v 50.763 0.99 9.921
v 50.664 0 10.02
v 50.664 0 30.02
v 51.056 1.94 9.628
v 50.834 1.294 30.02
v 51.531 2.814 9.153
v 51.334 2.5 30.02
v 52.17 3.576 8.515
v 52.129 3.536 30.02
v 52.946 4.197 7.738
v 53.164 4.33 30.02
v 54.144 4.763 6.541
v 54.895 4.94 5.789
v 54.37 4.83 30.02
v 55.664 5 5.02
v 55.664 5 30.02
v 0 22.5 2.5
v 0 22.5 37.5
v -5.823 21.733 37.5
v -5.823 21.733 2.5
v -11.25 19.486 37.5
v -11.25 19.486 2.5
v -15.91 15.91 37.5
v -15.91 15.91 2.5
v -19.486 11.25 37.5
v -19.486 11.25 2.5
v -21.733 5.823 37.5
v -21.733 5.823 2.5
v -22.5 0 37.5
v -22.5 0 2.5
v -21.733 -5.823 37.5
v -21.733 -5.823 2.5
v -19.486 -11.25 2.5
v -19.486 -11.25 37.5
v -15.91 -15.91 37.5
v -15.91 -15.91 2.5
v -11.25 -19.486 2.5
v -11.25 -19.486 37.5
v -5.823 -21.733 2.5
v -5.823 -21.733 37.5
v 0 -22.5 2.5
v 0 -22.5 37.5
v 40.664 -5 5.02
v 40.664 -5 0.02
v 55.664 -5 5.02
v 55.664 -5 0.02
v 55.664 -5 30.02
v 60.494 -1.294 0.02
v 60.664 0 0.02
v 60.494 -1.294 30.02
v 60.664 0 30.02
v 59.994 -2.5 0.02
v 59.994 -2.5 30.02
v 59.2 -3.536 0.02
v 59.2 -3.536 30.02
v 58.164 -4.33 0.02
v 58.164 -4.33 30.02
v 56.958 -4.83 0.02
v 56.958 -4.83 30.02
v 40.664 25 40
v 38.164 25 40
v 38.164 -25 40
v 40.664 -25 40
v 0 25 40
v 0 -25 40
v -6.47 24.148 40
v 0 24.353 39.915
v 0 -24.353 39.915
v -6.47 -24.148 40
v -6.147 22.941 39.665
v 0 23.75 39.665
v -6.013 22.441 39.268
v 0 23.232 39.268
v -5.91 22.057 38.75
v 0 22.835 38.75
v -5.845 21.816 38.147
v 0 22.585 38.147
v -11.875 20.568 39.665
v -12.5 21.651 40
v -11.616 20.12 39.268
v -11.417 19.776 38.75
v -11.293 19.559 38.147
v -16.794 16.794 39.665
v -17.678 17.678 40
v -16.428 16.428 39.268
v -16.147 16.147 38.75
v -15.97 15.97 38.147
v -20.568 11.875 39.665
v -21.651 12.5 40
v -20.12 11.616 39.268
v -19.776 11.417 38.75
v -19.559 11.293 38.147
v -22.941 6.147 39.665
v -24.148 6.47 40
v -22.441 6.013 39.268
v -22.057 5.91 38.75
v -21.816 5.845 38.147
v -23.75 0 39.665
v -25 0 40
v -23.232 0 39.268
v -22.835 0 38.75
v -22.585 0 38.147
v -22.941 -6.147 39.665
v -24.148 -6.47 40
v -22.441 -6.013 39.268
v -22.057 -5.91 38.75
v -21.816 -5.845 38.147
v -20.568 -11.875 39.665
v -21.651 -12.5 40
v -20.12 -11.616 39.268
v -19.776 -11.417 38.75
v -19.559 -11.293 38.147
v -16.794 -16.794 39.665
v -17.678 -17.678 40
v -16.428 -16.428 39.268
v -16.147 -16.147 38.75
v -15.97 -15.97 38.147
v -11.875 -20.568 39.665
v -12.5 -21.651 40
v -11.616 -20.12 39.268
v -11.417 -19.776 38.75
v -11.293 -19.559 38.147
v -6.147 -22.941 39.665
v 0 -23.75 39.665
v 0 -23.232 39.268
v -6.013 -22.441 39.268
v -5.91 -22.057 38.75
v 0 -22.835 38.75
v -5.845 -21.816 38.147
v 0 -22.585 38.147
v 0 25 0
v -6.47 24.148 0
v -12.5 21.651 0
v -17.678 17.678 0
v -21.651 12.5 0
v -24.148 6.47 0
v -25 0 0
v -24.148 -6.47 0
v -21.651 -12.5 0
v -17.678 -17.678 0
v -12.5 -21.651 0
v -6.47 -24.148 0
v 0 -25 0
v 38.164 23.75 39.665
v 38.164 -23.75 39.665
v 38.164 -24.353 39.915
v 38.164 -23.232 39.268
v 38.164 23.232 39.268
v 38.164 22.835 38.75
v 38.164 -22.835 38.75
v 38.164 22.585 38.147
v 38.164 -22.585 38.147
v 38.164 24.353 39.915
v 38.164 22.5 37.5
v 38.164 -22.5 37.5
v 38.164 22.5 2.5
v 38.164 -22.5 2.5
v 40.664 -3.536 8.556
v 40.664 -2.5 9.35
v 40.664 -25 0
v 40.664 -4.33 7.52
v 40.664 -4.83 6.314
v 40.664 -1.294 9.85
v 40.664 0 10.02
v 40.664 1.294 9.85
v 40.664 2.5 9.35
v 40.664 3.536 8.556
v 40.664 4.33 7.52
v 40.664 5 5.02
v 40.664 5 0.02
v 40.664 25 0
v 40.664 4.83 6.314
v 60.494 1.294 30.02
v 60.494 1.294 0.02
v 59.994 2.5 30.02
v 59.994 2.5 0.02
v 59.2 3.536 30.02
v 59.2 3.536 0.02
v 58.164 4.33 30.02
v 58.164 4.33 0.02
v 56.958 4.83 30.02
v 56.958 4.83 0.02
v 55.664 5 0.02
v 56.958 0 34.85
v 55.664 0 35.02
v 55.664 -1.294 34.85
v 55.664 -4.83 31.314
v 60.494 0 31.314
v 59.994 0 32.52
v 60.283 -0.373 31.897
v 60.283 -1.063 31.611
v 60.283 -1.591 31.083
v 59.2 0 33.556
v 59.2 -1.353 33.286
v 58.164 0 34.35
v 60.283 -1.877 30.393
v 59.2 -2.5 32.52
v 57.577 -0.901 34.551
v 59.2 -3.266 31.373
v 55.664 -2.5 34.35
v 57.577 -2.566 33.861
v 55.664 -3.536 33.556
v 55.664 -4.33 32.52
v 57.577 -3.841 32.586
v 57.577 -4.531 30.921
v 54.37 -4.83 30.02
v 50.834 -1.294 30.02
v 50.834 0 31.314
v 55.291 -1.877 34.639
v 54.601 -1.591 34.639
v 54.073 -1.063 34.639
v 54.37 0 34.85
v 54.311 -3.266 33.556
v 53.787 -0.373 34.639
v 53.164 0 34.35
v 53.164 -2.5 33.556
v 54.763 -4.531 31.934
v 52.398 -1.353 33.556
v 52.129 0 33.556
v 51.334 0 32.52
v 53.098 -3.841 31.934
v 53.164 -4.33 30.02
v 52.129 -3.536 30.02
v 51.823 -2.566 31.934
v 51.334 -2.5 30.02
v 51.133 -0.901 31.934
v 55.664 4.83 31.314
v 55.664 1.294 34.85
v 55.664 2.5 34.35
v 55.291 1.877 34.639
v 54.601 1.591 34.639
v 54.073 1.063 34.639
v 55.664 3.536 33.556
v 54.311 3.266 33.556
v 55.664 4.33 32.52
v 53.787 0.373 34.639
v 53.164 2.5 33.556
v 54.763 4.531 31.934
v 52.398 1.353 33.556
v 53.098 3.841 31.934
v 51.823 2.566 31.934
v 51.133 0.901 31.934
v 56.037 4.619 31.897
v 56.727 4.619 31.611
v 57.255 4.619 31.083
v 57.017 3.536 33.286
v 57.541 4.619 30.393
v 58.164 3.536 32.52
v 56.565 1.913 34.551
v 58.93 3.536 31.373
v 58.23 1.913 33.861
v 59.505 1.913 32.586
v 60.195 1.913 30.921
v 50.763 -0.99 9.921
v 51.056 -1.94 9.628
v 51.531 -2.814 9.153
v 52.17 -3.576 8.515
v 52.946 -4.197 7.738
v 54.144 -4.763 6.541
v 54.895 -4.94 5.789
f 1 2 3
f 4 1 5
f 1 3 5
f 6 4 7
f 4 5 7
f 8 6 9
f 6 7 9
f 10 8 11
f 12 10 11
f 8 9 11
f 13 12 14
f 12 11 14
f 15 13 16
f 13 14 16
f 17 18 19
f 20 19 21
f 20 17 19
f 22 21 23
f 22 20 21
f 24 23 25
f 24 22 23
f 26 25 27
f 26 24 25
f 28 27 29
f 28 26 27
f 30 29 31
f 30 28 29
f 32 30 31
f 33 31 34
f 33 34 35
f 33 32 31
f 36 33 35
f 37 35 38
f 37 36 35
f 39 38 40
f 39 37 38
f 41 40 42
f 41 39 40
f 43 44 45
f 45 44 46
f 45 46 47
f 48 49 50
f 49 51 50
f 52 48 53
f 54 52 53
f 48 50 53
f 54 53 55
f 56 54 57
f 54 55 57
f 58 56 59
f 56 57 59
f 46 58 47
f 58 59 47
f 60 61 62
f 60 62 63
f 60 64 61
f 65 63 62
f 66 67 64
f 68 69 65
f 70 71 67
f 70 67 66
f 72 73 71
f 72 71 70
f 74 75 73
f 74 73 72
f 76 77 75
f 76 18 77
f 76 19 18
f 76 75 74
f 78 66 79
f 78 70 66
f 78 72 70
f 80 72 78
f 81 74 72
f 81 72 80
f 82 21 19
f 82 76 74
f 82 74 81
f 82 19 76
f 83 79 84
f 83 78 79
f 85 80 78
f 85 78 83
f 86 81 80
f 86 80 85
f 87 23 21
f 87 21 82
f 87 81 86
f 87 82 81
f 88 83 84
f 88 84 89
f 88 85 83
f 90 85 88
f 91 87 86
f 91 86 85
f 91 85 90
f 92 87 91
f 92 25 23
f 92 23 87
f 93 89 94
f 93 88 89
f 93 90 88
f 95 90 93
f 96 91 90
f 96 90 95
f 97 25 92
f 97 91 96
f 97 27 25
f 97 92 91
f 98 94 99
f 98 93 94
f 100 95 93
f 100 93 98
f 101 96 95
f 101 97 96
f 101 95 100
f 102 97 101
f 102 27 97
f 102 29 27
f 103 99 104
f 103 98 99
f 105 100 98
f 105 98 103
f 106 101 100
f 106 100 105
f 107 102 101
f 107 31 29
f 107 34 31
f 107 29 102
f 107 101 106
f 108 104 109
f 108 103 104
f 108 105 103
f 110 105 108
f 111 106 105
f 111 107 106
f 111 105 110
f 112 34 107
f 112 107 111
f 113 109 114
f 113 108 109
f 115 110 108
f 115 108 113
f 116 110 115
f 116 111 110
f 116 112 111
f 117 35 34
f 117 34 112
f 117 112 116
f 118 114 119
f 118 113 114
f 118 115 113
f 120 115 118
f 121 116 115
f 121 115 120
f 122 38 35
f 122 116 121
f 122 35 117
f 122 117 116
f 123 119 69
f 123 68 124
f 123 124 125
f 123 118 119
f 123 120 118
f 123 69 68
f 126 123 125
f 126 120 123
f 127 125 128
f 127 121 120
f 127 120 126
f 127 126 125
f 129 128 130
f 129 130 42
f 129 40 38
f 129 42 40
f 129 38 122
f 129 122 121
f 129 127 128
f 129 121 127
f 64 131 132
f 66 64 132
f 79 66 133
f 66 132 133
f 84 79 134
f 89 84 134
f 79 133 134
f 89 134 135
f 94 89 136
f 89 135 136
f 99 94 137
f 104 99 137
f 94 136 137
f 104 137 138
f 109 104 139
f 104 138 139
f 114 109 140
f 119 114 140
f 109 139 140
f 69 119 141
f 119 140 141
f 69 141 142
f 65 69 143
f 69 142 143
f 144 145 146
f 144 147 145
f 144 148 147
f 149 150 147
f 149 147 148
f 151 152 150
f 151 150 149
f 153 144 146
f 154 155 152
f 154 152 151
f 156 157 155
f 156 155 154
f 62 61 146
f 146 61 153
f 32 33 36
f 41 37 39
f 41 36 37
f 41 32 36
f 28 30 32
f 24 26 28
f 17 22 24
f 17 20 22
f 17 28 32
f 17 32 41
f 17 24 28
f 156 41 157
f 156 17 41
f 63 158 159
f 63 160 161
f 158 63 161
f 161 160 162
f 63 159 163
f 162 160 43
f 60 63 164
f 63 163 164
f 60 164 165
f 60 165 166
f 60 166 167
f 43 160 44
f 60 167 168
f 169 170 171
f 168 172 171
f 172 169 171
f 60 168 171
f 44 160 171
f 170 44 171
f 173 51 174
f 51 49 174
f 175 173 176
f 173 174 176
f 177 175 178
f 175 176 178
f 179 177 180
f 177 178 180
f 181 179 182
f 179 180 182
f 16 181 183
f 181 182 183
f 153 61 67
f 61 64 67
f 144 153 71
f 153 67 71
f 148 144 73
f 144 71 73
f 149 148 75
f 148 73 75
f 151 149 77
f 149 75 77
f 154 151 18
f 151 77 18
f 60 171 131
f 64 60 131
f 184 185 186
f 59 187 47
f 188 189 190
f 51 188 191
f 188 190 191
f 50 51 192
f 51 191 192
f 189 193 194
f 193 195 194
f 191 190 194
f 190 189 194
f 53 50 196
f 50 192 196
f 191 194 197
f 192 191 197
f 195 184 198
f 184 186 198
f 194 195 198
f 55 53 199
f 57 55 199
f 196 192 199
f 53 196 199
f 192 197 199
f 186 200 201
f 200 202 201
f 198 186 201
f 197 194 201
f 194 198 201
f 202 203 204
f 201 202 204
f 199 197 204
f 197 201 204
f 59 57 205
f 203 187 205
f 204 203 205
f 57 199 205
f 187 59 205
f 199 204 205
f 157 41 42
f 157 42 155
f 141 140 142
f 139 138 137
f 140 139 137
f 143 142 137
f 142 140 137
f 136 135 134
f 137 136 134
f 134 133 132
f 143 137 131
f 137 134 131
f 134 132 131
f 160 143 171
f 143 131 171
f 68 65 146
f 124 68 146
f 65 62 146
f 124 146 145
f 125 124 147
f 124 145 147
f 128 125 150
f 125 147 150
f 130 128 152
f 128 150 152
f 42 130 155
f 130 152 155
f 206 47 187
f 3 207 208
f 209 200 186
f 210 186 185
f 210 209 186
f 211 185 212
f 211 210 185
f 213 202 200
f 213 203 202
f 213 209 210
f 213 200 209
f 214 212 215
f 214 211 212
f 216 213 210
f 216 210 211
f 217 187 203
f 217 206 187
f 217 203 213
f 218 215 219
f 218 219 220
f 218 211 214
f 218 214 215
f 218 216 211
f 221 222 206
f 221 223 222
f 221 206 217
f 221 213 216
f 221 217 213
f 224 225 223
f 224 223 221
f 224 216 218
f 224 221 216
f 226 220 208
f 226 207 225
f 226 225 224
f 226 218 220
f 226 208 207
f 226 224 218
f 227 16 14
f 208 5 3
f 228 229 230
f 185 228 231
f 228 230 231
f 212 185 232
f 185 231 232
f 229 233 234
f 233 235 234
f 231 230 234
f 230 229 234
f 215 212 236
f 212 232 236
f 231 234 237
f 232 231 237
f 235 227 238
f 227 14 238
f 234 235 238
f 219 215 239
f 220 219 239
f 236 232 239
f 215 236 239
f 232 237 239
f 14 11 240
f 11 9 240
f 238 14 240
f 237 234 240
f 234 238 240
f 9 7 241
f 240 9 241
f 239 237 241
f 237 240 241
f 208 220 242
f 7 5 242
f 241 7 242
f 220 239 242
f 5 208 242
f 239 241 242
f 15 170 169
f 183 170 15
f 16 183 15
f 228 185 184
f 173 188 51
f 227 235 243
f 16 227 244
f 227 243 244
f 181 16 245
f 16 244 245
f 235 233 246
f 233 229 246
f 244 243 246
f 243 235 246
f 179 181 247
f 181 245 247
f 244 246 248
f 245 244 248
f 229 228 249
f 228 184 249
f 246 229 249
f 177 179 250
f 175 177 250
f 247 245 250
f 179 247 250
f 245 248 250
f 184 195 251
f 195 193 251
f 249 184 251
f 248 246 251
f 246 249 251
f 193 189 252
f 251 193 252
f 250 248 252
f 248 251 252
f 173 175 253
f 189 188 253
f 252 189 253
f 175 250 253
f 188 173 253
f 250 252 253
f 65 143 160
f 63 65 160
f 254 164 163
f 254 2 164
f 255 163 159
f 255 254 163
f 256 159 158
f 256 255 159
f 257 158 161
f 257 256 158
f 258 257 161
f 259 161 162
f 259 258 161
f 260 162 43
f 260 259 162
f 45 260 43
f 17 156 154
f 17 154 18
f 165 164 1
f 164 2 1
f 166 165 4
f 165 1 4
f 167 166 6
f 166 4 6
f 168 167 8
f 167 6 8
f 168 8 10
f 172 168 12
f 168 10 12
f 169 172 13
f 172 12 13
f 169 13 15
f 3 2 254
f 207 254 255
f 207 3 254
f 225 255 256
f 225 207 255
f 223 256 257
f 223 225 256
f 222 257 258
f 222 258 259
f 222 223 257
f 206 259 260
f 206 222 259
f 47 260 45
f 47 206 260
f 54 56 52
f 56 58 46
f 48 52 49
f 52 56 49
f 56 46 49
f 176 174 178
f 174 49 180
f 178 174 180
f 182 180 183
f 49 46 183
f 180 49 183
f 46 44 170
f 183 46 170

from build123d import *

# Parameters (mm, degrees)
F1_DEPTH = 40
F2_T     = -2.5
F3_W     = 10
F3_H     = 10
F4_DEPTH = 20
F5_W     = 10
F5_H     = 10
F6_DEPTH = 25
F7_R     = 4.99999
F8_R     = 2.49999


# Not quite as in the source:
# - a fillet or chamfer is up to 0.001 mm smaller than in the source, because OpenCascade refuses the exact size


with BuildPart() as f1:
    # F0 (on Top) → F1 (new body)
    with BuildSketch(Plane.XY):
        with BuildLine():
            Line((40.6640707215, 25), (0, 25))
            ThreePointArc((0, 25), (-25, 0), (0, -25))
            Line((0, -25), (40.6640707215, -25))
            Line((40.6640707215, -25), (40.6640707215, 25))
        make_face()
    extrude(amount=F1_DEPTH)

    # F2
    f2_openings = [f1.faces().sort_by_distance(p)[0] for p in [
        (10.256385, 0, 40),
    ]]
    offset(amount=F2_T, openings=f2_openings)

    # F3 (on face) → F4 (join)
    with BuildSketch(Plane.YZ.offset(40.6640707215)):
        with Locations((0, 5.0200799115)):
            Rectangle(F3_W, F3_H)
    extrude(amount=F4_DEPTH)

    # F5 (on face) → F6 (join)
    with BuildSketch(Plane.XY.offset(10.0200799115)):
        with Locations((55.6640707215, 0)):
            Rectangle(F5_W, F5_H)
    extrude(amount=F6_DEPTH)

    # F7 (radius 5 in the source; OpenCascade refuses exactly that, so slightly less here)
    f7_edges = [f1.edges().sort_by_distance(p)[0] for p in [
        (45.664071, -5, 10.02008),
        (45.664071, 5, 10.02008),
        (50.664071, -5, 22.52008),
        (50.664071, 5, 22.52008),
        (55.664071, -5, 35.02008),
        (60.664071, 0, 35.02008),
        (55.664071, 5, 35.02008),
        (50.664071, 0, 35.02008),
        (60.664071, -5, 17.52008),
        (60.664071, 5, 17.52008),
    ]]
    fillet(f7_edges, radius=F7_R)

    # F8 (radius 2.5 in the source; OpenCascade refuses exactly that, so slightly less here)
    f8_edges = [f1.edges().sort_by_distance(p)[0] for p in [
        (-22.5, 0, 40),
    ]]
    fillet(f8_edges, radius=F8_R)


solid = f1.part
